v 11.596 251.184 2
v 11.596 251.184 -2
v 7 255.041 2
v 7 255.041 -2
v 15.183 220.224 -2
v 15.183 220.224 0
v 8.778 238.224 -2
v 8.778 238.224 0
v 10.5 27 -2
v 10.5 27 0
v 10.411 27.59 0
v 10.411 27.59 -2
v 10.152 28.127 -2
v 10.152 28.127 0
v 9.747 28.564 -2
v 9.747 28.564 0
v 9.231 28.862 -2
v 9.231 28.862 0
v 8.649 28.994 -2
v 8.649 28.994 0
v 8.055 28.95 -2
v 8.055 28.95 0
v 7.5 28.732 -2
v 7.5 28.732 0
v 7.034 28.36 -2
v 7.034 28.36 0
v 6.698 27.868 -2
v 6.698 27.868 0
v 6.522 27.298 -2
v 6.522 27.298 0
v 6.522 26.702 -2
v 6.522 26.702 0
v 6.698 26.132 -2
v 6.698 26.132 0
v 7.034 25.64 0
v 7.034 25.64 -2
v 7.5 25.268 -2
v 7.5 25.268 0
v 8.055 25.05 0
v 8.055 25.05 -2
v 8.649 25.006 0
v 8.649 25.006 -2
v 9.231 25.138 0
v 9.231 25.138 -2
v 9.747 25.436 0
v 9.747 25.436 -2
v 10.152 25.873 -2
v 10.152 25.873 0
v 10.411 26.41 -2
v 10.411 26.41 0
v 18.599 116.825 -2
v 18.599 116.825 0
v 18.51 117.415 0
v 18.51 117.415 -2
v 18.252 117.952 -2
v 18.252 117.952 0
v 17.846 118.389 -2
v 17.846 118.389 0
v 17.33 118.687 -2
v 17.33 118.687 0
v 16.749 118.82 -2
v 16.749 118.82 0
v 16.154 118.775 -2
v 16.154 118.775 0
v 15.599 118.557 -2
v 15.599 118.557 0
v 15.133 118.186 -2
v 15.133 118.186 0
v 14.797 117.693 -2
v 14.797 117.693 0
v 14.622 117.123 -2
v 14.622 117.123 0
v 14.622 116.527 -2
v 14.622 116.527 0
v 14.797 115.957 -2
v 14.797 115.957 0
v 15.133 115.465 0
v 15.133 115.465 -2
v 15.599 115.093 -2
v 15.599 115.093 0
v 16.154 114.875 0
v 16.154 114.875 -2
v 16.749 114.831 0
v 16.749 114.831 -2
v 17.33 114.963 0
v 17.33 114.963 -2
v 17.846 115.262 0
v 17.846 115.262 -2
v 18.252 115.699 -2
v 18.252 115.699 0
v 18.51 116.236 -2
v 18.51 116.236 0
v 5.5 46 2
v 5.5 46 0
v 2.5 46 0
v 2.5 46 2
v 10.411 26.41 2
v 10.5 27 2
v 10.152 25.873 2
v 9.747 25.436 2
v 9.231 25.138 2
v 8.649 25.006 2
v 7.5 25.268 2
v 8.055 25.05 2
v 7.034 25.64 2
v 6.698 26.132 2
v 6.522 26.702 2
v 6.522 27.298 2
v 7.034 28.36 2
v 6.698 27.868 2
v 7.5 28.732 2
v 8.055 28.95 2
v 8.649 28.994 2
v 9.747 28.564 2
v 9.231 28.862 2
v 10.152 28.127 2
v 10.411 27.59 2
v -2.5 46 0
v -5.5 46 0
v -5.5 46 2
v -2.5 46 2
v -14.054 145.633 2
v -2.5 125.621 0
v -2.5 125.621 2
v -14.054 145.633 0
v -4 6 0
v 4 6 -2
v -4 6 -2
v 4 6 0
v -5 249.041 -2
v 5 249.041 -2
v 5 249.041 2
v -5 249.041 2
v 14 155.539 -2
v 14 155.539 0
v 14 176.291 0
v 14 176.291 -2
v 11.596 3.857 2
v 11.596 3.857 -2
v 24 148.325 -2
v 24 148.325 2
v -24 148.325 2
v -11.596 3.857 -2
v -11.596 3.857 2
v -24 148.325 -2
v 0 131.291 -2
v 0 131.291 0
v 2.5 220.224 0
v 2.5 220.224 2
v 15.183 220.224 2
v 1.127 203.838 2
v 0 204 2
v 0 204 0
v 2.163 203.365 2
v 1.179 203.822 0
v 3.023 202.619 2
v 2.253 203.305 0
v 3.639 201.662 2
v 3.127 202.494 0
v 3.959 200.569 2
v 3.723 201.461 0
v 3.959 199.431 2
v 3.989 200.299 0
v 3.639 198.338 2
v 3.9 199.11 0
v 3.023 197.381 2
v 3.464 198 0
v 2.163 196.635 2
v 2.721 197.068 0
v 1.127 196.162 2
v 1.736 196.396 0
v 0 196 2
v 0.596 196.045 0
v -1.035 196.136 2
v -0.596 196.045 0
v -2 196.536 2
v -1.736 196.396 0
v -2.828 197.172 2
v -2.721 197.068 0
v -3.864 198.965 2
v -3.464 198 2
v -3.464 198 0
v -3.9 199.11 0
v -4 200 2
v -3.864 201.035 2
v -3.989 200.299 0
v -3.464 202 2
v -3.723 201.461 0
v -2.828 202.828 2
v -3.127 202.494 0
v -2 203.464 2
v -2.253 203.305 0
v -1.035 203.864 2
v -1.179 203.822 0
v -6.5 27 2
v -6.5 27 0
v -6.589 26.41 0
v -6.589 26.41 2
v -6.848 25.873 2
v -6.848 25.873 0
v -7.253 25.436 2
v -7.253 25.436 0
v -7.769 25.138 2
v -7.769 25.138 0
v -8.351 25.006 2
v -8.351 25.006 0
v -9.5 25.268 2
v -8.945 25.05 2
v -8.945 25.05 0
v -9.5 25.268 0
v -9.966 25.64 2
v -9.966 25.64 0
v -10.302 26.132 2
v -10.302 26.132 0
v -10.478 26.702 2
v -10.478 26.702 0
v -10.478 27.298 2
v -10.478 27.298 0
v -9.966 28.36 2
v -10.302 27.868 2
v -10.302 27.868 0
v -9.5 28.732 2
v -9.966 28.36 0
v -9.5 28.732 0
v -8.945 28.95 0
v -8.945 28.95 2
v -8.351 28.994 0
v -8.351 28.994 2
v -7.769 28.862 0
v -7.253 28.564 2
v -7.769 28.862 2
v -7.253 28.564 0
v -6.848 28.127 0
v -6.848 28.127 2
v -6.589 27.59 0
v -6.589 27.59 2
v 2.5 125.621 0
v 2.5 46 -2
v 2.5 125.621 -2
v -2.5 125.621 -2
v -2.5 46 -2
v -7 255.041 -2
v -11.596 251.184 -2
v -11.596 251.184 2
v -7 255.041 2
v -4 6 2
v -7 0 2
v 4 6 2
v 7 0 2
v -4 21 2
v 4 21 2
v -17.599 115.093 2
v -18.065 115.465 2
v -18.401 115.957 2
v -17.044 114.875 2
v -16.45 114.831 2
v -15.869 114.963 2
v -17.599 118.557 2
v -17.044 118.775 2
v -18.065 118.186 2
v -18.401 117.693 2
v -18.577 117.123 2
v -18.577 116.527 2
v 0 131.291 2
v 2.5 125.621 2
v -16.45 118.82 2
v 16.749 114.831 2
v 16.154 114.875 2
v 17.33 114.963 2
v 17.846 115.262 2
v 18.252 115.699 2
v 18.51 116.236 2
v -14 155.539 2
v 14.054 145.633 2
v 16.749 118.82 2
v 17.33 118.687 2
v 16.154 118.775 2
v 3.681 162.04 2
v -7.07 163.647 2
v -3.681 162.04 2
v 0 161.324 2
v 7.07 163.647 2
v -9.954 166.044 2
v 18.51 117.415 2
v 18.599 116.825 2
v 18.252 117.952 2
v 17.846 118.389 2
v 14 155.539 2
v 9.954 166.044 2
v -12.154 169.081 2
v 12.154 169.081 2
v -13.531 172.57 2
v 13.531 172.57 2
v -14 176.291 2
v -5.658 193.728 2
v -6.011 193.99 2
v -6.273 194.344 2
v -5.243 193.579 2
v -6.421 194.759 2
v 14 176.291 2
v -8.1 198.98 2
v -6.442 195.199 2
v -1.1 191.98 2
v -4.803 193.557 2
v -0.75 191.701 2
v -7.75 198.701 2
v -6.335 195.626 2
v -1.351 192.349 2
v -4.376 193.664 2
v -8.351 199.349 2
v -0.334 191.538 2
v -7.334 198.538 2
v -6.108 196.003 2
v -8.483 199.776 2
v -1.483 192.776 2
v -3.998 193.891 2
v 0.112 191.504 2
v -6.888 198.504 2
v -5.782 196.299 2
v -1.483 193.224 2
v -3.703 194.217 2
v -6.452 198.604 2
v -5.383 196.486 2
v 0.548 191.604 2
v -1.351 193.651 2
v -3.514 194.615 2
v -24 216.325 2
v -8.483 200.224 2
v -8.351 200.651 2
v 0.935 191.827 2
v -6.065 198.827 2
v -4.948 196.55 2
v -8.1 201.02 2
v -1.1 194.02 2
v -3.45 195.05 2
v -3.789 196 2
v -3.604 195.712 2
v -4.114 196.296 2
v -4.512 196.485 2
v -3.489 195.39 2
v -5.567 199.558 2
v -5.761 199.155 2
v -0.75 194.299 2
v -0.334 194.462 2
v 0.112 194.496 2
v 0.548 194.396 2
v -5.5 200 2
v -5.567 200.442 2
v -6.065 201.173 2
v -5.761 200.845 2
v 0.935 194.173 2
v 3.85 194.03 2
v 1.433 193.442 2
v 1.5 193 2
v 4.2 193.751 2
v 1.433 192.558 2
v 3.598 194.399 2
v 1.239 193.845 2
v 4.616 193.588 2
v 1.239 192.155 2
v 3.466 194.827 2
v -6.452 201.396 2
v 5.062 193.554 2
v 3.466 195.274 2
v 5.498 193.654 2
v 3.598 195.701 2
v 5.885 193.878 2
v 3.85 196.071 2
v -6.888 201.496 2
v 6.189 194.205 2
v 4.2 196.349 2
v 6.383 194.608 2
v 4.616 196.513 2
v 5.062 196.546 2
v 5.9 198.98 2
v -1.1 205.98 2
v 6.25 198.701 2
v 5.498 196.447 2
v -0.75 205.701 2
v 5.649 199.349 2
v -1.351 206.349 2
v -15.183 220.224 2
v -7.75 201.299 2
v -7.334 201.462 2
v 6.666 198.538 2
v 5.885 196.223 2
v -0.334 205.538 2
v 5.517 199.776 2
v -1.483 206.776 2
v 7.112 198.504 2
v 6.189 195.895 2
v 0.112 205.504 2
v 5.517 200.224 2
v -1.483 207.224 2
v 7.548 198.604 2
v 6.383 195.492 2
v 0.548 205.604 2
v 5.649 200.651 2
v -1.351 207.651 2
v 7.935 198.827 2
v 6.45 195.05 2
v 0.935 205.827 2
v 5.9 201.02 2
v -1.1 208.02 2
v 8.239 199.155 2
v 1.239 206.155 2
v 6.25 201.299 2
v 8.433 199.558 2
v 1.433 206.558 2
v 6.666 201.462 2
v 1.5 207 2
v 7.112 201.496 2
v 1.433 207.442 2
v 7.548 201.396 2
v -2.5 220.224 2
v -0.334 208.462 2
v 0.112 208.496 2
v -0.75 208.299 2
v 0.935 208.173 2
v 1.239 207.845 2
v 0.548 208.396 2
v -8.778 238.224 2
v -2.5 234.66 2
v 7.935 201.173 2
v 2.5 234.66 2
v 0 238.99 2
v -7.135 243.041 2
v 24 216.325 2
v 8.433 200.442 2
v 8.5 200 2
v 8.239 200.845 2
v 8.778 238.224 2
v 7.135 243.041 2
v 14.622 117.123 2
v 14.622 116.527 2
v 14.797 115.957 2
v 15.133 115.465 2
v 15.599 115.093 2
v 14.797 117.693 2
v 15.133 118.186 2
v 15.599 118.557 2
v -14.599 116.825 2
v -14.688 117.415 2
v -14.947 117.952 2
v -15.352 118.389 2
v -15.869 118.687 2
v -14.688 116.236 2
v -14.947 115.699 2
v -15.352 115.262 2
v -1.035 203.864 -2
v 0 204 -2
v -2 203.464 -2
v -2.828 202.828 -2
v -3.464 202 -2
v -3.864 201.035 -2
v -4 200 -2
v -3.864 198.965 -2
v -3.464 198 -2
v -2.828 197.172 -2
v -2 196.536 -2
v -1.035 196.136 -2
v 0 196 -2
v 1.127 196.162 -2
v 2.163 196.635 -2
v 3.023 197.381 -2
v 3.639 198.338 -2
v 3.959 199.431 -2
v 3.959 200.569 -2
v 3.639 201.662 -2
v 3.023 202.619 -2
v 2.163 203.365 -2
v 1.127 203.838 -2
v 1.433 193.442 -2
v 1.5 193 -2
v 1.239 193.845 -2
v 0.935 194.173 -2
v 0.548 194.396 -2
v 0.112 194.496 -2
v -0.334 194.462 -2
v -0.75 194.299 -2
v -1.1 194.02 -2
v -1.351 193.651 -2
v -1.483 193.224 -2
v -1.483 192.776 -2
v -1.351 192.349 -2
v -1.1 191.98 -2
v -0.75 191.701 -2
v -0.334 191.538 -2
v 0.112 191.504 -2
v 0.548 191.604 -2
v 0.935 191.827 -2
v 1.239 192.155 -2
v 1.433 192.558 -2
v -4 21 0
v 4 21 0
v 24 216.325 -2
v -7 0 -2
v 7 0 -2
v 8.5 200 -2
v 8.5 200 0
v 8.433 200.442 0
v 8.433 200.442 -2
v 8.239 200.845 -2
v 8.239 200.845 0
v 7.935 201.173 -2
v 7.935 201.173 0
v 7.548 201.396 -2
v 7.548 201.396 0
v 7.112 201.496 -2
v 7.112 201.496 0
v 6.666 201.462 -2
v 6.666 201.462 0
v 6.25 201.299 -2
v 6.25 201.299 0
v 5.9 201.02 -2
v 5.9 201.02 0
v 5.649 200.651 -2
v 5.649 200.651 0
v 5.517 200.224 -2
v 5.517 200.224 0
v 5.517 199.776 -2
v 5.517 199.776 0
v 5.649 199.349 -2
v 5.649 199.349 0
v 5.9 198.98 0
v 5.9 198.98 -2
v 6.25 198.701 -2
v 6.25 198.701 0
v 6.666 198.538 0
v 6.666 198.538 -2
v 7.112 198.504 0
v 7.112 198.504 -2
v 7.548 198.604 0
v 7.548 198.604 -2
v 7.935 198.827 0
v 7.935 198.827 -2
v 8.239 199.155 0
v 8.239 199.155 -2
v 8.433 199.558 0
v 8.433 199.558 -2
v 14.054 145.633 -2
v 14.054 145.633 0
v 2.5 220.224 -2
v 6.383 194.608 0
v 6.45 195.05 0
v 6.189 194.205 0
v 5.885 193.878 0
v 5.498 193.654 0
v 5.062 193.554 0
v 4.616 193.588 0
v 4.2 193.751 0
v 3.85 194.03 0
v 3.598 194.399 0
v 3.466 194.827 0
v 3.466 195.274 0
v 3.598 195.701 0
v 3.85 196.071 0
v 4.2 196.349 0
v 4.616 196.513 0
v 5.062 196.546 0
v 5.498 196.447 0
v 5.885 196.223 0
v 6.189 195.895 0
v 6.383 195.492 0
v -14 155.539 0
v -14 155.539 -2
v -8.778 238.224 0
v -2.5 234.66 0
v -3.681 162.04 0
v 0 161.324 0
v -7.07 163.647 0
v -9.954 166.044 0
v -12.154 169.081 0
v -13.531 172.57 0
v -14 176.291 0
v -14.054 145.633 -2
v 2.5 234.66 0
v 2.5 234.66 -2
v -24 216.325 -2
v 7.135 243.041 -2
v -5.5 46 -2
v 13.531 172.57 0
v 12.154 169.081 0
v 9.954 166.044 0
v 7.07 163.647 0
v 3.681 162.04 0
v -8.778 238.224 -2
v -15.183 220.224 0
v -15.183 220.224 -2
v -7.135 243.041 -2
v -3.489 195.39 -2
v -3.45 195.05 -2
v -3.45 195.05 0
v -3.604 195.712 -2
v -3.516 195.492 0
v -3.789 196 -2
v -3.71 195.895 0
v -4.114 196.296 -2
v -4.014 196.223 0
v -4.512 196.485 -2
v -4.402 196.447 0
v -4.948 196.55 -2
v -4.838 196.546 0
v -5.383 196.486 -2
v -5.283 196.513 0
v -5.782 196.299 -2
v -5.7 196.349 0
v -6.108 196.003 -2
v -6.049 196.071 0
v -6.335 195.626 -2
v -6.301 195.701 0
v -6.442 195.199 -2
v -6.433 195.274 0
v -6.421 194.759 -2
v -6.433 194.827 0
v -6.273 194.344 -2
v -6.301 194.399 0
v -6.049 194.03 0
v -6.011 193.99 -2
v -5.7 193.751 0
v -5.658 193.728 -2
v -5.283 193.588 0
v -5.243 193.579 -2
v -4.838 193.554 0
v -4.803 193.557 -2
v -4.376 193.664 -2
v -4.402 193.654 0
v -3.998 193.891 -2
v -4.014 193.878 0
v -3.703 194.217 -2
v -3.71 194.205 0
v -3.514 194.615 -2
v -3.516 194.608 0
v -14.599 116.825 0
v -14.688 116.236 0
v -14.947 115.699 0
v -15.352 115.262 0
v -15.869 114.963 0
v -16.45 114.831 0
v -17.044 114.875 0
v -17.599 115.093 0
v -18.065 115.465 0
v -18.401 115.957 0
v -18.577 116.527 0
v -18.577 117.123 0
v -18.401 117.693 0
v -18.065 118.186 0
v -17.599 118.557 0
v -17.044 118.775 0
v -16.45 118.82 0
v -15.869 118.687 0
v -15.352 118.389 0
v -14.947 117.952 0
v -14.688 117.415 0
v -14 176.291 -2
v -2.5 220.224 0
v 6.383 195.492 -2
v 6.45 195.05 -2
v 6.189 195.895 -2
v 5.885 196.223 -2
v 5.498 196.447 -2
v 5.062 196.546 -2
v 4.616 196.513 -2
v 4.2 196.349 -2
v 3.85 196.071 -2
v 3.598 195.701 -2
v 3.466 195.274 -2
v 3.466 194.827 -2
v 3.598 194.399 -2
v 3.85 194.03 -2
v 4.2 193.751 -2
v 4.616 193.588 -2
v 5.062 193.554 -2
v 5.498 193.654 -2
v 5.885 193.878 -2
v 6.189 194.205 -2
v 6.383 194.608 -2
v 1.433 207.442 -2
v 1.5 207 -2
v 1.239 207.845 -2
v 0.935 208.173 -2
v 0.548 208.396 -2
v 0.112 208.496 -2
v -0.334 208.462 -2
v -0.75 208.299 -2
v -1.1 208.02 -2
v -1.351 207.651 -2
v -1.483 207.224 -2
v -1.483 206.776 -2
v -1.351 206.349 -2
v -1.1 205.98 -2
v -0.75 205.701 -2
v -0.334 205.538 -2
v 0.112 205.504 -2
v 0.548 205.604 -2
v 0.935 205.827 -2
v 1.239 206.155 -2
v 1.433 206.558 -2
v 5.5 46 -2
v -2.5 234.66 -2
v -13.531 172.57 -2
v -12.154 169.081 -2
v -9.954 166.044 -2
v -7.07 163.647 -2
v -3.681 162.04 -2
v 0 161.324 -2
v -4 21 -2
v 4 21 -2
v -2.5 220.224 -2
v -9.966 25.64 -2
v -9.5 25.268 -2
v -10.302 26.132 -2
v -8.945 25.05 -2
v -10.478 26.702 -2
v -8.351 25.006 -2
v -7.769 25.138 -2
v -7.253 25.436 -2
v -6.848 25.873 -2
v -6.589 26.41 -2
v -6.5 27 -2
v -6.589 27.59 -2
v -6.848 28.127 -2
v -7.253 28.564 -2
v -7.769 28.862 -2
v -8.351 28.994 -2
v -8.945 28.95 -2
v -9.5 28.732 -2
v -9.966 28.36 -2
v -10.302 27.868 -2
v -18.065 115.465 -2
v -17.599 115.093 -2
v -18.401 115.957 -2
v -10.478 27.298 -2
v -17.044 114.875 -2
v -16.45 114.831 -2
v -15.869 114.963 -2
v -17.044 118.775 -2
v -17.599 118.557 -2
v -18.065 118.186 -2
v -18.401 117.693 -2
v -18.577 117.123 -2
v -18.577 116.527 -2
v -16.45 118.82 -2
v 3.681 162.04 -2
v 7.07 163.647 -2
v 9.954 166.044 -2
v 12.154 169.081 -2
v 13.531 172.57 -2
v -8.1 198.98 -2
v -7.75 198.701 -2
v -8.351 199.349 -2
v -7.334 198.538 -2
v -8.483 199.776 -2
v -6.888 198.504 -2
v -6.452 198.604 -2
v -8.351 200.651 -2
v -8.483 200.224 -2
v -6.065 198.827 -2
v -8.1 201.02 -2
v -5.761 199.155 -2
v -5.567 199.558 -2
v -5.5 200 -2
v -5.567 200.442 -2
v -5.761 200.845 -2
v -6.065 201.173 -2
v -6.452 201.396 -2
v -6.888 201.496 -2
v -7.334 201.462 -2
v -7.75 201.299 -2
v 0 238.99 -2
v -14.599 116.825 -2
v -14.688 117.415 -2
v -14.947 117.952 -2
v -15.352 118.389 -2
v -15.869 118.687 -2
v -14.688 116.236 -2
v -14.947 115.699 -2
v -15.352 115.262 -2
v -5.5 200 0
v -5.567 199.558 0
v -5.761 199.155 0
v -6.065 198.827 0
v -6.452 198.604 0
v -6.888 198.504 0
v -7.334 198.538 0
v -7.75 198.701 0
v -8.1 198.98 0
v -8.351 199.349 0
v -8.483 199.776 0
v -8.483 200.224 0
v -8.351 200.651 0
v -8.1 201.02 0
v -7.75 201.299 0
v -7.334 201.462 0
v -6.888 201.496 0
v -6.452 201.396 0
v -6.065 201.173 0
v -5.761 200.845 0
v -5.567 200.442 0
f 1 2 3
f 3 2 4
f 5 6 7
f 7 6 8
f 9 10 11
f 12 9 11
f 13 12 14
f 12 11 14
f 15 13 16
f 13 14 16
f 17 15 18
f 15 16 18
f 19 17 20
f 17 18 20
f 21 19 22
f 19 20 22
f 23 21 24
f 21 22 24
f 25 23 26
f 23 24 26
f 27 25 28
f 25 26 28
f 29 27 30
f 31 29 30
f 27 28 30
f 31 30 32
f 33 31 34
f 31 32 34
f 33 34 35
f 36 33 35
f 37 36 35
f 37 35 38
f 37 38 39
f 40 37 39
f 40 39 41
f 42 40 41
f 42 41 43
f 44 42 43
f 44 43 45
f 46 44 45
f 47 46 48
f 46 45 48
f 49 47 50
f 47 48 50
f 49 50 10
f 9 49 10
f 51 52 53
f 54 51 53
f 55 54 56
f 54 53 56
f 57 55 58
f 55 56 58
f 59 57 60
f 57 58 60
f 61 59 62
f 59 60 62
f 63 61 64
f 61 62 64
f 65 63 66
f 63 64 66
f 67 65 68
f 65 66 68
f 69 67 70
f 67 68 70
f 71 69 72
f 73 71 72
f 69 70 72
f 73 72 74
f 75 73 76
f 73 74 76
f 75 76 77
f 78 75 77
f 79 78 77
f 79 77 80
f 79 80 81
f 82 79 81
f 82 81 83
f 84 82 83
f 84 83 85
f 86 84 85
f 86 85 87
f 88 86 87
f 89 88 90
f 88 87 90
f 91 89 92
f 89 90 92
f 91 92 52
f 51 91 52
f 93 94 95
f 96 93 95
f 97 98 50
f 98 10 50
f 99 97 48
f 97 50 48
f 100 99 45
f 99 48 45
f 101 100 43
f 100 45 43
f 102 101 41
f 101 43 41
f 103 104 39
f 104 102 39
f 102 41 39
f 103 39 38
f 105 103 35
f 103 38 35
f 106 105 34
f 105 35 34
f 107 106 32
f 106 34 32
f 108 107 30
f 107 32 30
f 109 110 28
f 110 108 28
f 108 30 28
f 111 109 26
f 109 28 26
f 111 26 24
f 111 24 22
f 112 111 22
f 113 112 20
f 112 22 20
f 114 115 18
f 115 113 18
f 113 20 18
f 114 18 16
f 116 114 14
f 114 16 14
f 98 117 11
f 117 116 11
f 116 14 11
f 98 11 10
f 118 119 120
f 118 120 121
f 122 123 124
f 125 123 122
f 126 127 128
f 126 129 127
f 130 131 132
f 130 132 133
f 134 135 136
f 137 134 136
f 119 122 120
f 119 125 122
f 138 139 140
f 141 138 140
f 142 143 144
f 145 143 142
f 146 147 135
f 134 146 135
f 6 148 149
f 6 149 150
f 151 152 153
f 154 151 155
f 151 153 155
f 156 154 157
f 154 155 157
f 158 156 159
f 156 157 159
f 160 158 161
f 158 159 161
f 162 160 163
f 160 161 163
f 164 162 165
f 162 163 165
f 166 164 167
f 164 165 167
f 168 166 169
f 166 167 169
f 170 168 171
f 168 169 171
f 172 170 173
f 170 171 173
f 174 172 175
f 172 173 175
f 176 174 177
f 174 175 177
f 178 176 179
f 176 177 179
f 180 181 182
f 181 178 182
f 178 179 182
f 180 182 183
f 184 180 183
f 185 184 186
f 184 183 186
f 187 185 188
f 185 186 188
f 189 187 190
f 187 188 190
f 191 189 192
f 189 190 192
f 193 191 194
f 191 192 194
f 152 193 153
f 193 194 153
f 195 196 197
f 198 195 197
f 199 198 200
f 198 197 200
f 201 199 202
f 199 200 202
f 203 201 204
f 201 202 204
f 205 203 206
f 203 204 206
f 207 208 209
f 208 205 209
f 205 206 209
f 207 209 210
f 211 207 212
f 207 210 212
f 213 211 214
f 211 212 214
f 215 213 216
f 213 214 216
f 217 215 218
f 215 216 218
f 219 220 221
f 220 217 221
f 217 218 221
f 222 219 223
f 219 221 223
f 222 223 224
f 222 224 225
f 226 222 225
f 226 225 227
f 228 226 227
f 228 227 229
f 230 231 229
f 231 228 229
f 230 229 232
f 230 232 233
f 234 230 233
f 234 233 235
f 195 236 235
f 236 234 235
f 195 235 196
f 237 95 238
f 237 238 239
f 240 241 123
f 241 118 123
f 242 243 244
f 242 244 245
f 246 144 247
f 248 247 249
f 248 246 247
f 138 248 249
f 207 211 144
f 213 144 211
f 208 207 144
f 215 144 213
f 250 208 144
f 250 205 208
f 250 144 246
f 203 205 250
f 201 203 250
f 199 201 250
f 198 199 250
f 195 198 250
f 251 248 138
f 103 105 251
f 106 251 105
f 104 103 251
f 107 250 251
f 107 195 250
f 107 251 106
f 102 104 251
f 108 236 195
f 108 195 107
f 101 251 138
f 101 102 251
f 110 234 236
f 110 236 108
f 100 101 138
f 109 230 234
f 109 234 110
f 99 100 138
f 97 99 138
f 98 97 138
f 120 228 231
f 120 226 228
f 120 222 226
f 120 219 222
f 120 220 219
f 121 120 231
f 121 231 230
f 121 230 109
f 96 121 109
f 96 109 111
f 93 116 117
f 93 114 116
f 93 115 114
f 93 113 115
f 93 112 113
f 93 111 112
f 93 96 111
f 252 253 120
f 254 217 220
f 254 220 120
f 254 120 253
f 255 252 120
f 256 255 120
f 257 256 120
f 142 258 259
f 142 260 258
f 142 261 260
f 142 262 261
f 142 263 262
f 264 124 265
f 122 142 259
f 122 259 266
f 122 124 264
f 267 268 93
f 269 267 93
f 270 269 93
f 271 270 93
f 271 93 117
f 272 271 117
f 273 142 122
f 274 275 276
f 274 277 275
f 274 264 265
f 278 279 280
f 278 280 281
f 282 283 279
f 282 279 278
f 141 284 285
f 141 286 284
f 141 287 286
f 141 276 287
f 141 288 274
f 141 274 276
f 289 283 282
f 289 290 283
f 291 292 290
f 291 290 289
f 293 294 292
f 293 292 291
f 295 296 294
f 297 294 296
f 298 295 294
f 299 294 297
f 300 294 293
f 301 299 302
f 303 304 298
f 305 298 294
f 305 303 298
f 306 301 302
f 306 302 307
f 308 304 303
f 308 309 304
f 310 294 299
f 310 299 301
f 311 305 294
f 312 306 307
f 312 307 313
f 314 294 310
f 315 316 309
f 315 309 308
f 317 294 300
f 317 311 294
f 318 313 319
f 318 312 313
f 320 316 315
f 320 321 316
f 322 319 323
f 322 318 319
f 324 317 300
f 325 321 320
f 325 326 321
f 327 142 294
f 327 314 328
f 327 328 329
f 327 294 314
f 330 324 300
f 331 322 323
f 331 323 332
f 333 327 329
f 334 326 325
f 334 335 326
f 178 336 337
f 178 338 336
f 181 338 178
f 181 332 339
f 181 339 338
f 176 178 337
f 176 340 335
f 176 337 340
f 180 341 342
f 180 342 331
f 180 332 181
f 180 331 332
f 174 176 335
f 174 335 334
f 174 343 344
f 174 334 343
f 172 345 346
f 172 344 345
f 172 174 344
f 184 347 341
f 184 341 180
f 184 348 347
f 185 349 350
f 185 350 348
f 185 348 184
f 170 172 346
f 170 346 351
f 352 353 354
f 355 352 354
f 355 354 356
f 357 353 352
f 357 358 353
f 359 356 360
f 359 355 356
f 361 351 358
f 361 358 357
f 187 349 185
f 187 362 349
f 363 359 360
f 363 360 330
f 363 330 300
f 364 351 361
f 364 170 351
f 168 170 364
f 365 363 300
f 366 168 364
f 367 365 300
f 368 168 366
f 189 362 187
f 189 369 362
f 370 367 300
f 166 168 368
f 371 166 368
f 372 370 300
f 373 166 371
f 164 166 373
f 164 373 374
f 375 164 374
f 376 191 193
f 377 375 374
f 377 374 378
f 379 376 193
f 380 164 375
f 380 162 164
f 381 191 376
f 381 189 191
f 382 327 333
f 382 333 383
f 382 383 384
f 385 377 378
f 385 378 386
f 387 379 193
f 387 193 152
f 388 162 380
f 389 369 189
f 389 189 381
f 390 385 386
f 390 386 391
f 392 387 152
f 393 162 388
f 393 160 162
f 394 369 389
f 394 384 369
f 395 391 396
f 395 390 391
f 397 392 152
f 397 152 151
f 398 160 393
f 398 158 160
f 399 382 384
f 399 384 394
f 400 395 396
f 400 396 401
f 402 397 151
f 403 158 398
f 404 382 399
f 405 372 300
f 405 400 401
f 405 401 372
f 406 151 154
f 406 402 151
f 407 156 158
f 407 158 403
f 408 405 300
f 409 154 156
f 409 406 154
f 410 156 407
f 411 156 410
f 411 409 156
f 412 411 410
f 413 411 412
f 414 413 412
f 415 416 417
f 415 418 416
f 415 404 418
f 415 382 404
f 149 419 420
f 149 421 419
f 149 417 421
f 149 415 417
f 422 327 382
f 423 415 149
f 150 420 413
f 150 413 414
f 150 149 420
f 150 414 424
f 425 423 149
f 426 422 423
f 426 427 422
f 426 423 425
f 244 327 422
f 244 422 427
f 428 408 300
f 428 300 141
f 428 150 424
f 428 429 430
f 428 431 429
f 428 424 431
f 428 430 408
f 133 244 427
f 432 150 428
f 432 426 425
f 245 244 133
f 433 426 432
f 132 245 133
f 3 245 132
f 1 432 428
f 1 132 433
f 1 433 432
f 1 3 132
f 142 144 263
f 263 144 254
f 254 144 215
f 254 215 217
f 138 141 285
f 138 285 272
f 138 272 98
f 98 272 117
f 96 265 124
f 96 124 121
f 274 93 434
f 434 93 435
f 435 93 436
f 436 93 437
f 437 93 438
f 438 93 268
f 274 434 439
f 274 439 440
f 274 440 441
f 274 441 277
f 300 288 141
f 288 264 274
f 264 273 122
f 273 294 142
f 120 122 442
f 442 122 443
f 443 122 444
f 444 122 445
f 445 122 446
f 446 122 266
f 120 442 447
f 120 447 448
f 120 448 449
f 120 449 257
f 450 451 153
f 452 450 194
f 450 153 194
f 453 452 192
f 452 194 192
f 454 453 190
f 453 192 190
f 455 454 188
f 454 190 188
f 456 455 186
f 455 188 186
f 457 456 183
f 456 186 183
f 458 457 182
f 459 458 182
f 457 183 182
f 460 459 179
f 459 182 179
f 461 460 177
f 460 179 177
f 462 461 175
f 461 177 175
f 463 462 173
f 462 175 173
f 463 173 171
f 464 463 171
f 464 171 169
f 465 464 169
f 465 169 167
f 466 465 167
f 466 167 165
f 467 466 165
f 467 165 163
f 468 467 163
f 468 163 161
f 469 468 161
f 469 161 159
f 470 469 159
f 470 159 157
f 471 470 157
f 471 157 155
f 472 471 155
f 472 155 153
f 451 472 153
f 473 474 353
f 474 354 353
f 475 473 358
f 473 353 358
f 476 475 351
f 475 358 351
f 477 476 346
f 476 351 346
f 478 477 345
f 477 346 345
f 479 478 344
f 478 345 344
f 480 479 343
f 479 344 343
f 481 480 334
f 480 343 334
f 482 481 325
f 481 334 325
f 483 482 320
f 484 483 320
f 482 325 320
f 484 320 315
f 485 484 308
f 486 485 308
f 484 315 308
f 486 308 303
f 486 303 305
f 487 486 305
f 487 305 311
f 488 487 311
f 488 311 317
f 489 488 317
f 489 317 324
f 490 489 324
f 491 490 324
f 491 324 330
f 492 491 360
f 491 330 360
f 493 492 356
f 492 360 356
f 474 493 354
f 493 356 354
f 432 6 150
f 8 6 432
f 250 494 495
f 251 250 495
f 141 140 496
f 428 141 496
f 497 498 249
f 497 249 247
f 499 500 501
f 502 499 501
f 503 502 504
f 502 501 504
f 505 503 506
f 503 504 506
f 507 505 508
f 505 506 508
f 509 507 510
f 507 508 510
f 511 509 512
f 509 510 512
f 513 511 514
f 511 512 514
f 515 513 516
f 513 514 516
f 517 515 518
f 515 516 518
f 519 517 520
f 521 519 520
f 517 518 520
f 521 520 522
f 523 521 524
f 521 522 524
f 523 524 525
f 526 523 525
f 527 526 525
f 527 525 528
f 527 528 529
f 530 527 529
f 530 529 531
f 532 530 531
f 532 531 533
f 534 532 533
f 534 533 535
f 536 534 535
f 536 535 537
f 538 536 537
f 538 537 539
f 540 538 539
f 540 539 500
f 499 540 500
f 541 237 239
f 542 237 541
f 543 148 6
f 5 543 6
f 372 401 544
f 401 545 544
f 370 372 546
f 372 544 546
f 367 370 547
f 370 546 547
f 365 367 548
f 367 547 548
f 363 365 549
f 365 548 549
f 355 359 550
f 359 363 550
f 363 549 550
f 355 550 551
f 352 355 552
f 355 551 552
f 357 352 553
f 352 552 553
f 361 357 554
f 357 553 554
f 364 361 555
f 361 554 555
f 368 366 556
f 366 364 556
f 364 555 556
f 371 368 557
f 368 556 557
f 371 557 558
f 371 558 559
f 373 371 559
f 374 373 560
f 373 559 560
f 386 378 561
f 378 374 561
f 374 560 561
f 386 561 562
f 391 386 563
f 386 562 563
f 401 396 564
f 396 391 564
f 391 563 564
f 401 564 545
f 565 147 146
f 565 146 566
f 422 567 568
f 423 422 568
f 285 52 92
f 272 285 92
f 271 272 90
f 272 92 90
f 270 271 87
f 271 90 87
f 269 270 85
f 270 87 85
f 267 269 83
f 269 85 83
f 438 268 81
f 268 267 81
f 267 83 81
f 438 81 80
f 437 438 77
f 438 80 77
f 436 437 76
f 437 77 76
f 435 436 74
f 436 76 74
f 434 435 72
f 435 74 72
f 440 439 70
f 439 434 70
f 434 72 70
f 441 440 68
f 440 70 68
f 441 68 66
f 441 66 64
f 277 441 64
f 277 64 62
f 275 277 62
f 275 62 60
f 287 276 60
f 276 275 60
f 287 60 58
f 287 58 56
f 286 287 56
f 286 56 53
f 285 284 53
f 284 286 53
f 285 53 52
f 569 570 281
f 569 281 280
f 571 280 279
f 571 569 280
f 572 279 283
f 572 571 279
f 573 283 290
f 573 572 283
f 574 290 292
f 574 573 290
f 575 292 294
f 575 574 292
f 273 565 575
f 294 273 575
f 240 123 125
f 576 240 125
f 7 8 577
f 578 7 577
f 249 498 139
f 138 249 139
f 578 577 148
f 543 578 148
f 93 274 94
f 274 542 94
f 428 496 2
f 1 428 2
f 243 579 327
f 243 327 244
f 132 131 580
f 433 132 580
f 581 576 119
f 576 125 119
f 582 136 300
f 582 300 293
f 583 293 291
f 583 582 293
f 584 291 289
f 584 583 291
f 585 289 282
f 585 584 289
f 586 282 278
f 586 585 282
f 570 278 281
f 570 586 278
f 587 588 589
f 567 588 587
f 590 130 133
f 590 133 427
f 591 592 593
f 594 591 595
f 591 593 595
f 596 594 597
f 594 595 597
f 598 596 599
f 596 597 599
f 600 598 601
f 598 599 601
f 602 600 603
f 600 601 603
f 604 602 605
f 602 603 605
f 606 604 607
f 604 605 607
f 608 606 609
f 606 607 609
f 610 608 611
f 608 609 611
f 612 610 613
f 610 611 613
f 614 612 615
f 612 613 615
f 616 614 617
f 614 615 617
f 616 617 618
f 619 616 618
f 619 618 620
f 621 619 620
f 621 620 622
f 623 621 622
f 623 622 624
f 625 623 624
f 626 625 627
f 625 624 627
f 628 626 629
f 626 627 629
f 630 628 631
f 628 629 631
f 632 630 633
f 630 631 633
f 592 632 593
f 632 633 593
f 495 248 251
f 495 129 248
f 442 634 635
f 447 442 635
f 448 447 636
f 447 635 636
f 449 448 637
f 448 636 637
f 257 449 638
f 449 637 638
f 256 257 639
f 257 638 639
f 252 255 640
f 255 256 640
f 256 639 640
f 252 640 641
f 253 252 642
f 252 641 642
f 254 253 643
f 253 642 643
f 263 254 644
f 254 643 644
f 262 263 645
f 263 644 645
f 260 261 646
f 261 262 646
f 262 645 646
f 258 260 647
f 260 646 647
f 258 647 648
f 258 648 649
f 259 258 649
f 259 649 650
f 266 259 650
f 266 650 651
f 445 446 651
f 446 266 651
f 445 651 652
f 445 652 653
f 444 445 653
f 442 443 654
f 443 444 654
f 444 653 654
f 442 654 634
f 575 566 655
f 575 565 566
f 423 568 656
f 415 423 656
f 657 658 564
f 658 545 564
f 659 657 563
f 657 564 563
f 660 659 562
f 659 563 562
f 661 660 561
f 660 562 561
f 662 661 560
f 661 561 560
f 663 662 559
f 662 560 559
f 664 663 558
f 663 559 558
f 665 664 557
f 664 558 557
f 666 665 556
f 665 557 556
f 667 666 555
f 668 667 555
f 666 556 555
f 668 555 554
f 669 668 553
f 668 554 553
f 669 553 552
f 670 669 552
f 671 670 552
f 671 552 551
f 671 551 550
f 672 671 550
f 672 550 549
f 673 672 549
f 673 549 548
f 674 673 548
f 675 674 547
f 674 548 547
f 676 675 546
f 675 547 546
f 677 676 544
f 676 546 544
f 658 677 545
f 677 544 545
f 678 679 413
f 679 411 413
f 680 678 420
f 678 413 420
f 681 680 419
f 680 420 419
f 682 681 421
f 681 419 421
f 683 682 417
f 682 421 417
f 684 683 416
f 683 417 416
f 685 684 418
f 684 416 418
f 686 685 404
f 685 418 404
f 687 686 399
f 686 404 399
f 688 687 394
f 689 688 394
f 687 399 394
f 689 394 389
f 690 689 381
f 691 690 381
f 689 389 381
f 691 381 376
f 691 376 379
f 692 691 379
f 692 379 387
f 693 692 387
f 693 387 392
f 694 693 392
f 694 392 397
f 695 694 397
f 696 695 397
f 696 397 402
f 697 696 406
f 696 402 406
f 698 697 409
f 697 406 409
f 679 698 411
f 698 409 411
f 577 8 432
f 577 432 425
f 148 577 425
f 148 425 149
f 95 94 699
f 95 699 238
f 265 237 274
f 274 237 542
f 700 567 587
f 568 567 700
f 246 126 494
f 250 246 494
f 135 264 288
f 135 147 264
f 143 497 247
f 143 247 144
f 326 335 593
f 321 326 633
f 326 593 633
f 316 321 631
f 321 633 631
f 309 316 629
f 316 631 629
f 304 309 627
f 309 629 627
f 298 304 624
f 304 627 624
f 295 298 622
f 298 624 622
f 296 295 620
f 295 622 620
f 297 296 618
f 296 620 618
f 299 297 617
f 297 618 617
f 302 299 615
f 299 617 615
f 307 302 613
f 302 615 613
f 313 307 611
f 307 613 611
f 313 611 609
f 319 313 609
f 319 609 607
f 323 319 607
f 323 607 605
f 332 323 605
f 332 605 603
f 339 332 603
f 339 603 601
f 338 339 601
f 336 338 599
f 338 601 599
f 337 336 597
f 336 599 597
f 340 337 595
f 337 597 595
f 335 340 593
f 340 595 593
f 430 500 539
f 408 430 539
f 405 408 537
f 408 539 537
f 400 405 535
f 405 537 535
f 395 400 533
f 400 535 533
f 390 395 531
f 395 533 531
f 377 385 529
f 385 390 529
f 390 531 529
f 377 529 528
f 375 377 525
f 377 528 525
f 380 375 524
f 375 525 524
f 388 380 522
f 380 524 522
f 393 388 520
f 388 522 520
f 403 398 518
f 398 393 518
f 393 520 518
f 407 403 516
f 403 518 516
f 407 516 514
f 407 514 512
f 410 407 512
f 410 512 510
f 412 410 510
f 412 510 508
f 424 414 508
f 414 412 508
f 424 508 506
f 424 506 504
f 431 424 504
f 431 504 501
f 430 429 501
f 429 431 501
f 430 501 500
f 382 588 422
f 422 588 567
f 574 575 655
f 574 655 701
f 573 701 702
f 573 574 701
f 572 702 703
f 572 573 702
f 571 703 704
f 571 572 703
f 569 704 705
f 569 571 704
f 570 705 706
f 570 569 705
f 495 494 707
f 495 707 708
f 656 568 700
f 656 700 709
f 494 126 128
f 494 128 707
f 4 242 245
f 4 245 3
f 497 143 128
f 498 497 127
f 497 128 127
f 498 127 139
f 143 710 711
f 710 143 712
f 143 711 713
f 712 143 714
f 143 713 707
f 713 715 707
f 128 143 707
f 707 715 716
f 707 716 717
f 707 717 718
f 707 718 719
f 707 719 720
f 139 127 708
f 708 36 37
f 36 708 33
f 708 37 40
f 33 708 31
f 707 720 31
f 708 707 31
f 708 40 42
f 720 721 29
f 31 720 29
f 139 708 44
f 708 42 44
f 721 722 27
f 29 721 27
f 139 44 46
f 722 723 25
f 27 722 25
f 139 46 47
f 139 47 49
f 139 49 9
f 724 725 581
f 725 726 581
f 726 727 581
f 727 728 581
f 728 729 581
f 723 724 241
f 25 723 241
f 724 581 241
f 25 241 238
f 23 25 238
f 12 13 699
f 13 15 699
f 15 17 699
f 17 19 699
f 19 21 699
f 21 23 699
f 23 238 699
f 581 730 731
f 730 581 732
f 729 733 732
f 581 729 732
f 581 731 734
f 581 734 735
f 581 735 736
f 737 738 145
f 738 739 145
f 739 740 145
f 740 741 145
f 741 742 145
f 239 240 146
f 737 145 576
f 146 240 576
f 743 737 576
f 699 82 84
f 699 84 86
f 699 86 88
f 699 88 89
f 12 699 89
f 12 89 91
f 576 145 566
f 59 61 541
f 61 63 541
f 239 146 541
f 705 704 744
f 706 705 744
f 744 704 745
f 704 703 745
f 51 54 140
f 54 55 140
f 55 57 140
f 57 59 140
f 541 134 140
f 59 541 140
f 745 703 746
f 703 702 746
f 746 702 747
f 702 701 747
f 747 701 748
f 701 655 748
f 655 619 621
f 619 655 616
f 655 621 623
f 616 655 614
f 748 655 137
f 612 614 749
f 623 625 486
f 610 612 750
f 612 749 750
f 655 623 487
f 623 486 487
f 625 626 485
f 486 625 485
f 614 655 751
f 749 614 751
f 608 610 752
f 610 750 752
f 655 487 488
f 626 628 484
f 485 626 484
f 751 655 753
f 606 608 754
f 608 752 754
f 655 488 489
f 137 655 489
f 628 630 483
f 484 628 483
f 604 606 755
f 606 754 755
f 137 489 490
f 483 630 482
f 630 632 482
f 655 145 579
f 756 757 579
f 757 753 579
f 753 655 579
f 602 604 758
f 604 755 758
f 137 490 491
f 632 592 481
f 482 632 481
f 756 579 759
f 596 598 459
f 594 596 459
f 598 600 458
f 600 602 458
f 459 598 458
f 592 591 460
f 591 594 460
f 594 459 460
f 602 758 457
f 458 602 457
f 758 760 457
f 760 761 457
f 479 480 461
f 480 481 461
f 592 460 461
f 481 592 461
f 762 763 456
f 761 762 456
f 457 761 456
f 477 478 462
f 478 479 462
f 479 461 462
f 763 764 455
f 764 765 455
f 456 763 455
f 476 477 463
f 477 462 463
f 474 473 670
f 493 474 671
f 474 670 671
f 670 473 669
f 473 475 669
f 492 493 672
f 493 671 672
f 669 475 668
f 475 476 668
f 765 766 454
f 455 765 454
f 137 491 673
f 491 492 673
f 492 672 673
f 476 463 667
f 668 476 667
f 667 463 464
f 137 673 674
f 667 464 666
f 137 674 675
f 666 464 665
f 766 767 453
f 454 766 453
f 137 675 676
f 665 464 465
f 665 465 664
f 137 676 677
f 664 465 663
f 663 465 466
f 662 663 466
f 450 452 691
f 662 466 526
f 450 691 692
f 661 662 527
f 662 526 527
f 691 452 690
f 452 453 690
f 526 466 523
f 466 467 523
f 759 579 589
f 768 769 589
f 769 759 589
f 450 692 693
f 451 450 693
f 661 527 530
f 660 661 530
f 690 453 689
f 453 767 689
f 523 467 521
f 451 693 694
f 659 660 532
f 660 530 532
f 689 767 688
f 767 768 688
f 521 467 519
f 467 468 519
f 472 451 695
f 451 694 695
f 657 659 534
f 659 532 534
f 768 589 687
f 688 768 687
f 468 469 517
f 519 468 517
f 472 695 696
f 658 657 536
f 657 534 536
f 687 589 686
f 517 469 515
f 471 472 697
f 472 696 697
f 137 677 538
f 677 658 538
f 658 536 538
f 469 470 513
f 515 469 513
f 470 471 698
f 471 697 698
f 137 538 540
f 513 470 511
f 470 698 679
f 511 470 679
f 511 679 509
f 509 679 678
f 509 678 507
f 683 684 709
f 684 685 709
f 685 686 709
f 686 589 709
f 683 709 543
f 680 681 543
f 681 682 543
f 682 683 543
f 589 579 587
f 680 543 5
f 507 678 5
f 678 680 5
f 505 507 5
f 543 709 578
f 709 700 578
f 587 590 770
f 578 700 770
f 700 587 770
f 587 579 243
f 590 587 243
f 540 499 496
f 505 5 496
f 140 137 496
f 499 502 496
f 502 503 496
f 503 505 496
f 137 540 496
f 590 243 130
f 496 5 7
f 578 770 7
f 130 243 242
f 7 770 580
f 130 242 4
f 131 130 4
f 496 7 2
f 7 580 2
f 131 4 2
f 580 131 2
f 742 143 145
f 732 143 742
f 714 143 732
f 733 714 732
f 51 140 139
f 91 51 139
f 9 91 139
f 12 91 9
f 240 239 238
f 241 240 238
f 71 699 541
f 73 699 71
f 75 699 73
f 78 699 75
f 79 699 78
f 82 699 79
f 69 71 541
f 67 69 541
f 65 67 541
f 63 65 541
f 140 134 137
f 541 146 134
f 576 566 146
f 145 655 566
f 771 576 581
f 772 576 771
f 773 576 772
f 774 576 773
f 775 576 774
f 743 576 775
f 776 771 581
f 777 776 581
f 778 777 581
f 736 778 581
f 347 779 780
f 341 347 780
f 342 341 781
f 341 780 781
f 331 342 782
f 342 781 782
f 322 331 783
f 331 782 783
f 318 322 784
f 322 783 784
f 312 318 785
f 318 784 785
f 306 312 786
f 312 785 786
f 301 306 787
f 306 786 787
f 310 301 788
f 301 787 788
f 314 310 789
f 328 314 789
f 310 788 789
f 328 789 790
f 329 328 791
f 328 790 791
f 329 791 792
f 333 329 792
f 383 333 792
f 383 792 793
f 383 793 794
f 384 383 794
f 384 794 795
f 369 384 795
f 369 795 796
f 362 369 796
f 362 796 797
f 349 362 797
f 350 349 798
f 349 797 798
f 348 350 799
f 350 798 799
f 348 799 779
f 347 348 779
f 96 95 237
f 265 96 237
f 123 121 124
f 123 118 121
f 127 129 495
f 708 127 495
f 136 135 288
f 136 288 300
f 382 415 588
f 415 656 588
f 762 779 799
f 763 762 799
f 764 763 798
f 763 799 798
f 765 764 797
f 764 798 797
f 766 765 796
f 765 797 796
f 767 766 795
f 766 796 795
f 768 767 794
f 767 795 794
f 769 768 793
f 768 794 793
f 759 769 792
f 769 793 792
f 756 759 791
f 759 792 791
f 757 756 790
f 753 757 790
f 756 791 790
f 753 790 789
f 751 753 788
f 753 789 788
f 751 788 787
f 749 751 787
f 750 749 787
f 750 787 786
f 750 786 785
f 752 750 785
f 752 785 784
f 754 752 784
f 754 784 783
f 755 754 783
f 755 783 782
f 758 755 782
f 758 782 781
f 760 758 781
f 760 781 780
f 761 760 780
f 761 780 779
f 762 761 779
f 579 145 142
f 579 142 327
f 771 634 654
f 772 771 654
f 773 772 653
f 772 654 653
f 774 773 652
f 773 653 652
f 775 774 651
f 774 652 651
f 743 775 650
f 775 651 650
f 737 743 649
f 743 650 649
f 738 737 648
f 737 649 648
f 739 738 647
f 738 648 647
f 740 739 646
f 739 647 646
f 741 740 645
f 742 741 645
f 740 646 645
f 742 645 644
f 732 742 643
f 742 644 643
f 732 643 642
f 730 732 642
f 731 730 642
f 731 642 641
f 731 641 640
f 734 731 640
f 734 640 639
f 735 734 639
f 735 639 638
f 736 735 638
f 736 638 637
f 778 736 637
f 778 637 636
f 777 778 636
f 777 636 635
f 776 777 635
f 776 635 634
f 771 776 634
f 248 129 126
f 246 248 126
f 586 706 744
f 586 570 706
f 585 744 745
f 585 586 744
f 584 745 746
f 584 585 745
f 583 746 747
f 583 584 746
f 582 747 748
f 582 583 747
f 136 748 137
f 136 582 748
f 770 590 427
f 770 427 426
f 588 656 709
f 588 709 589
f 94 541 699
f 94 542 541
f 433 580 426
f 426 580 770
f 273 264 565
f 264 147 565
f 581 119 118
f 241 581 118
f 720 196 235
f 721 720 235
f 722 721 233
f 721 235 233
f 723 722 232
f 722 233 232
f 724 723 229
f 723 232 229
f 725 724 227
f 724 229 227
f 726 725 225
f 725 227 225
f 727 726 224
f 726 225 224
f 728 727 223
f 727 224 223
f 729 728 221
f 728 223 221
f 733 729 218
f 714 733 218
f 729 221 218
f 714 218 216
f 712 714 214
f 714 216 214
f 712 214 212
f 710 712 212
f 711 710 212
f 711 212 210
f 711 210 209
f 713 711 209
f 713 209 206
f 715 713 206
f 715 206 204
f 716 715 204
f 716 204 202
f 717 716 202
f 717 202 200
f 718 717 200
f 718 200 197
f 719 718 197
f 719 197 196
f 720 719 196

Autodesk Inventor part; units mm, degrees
ref_plane "YZ Plane" through (0, 0, 0) normal (1, 0, 0) x (0, 1, 0)
ref_plane "XZ Plane" through (0, 0, 0) normal (0, 1, 0) x (-1, 0, 0)
ref_plane "XY Plane" through (0, 0, 0) normal (0, 0, 1) x (1, 0, 0)
sketch "Sketch1" plane through (0, 0, 0) normal (0, 0, 1) x (1, 0, 0)
  line L0 (0, 0) -> (-7, 0)
  line L1 (-7, 0) -> (-11.5963, 3.8567)
  line L2 (-11.5963, 3.8567) -> (-24, 148.3252)
  line L3 (-24, 148.3252) -> (-24, 216.3252)
  line L4 (-24, 216.3252) -> (-11.5963, 251.1842)
  line L5 (-11.5963, 251.1842) -> (-7, 255.0409)
  line L6 (-7, 255.0409) -> (0, 255.0409)
  line L7 (0, 255.0409) -> (0, 0)
  line L8 (0, 6) -> (-4, 6)
  line L9 (-4, 6) -> (-4, 21)
  line L10 (-4, 21) -> (0, 21)
  line L11 (-5.5, 46) -> (-2.5, 46)
  line L12 (-2.5, 46) -> (-2.5, 125.6208)
  line L13 (-2.5, 125.6208) -> (-14.0543, 145.6334)
  line L14 (-14.0543, 145.6334) -> (-5.5, 46)
  line L15 (0, 249.0409) -> (-5, 249.0409)
  line L16 (-5, 249.0409) -> (-7.135, 243.0409)
  line L17 (-7.135, 243.0409) -> (0, 238.9899)
  line L18 (-8.7779, 238.224) -> (-2.5, 234.6596)
  line L19 (-2.5, 234.6596) -> (-2.5, 220.224)
  line L20 (-2.5, 220.224) -> (-15.1828, 220.224)
  line L21 (-15.1828, 220.224) -> (-8.7779, 238.224)
  line L22 (0, 131.2907) -> (-14, 155.5394)
  arc A0 (0, 204) -> (0, 196) centre (0, 200) ccw
  circle A1 centre (-7, 200) radius 1.5
  line L23 (0, 0) -> (7, 0)
  line L24 (7, 0) -> (11.5963, 3.8567)
  line L25 (11.5963, 3.8567) -> (24, 148.3252)
  line L26 (24, 148.3252) -> (24, 216.3252)
  line L27 (24, 216.3252) -> (11.5963, 251.1842)
  line L28 (11.5963, 251.1842) -> (7, 255.0409)
  line L29 (7, 255.0409) -> (0, 255.0409)
  line L30 (0, 6) -> (4, 6)
  line L31 (4, 6) -> (4, 21)
  line L32 (4, 21) -> (0, 21)
  line L33 (5.5, 46) -> (2.5, 46)
  line L34 (2.5, 46) -> (2.5, 125.6208)
  line L35 (2.5, 125.6208) -> (14.0543, 145.6334)
  line L36 (14.0543, 145.6334) -> (5.5, 46)
  line L37 (0, 249.0409) -> (5, 249.0409)
  line L38 (5, 249.0409) -> (7.135, 243.0409)
  line L39 (7.135, 243.0409) -> (0, 238.9899)
  line L40 (8.7779, 238.224) -> (2.5, 234.6596)
  line L41 (2.5, 234.6596) -> (2.5, 220.224)
  line L42 (2.5, 220.224) -> (15.1828, 220.224)
  line L43 (15.1828, 220.224) -> (8.7779, 238.224)
  line L44 (0, 131.2907) -> (14, 155.5394)
  arc A2 (0, 196) -> (0, 204) centre (0, 200) ccw
  circle A3 centre (-16.5993, 116.8252) radius 2
  circle A4 centre (16.5993, 116.8252) radius 2
  circle A5 centre (-8.5, 27) radius 2
  circle A6 centre (8.5, 27) radius 2
  line L45 (0, 200) -> (-10, 200)
  line L46 (0, 204) -> (-14, 204)
  line L47 (0, 196) -> (-14, 196)
  circle A7 centre (-4.9497, 195.0503) radius 1.5
  circle A8 centre (0, 193) radius 1.5
  circle A9 centre (4.9497, 195.0503) radius 1.5
  circle A10 centre (7, 200) radius 1.5
  circle A11 centre (0, 207) radius 1.5
  line L48 (-14, 155.5394) -> (-14, 176.2907)
  arc A12 (-14, 176.2907) -> (0, 161.3241) centre (1, 176.2907) ccw
  line L49 (14, 155.5394) -> (14, 176.2907)
  arc A13 (0, 161.3241) -> (14, 176.2907) centre (-1, 176.2907) ccw
  point P0 (0, 155.5394)
  dimension "d0" = 7
  dimension "d1" = 6
  dimension "d2" = 145
  dimension "d3" = 68
  dimension "d4" = 37
  dimension "d5" = 48
  dimension "d8" = 140
  dimension "d9" = 140
  dimension "d10" = 15
  dimension "d11" = 6
  dimension "d12" = 4
  dimension "d13" = 3
  dimension "d14" = 5
  dimension "d15" = 25
  dimension "d17" = 100
  dimension "d19" = 5
  dimension "d20" = 28
  dimension "d21" = 150
  dimension "d29" = 6
  dimension "d32" = 6
  dimension "d33" = 4
  dimension "d38" = 3
  dimension "d42" = 4
  dimension "d43" = 31.5
  dimension "d45" = 5
  dimension "d46" = 4
  dimension "d47" = 17
  dimension "d48" = 6
  dimension "d51" = 200
  dimension "d54" = 3
  dimension "d56" = 14
  dimension "d57" = 8
  dimension "d58" = 7
  dimension "d61" = 180
  dimension "d63" = 5
  dimension "d64" = 5
  dimension "d65" = 100
  dimension "d66" = 7
  dimension "d67" = 5
  dimension "d68" = 18
  dimension "d69" = 15
  dimension "d70" = 15
  dimension "d71" = 45
extrude "Extrusion1" add sketch "Sketch1" along normal mid plane 4 contours L0 L1 L2 L3 L4 L5 L6 L7 L15 L16 L17 A11 A0 A8 A12 L48 L22 L10 L9 L8 | L7 L30 L31 L32 L44 L49 A13 A8 A2 A11 L39 L38 L37 L29 L28 L27 L26 L25 L24 L23 | A8 L7 | L7 A8 | A11 L7 | L7 A11
extrude "Extrusion2" cut sketch "Sketch1" along normal mid plane 10 contours A8 L7 | L7 A8 | A11 L7 | L7 A11
properties part number "Leg_part3"
